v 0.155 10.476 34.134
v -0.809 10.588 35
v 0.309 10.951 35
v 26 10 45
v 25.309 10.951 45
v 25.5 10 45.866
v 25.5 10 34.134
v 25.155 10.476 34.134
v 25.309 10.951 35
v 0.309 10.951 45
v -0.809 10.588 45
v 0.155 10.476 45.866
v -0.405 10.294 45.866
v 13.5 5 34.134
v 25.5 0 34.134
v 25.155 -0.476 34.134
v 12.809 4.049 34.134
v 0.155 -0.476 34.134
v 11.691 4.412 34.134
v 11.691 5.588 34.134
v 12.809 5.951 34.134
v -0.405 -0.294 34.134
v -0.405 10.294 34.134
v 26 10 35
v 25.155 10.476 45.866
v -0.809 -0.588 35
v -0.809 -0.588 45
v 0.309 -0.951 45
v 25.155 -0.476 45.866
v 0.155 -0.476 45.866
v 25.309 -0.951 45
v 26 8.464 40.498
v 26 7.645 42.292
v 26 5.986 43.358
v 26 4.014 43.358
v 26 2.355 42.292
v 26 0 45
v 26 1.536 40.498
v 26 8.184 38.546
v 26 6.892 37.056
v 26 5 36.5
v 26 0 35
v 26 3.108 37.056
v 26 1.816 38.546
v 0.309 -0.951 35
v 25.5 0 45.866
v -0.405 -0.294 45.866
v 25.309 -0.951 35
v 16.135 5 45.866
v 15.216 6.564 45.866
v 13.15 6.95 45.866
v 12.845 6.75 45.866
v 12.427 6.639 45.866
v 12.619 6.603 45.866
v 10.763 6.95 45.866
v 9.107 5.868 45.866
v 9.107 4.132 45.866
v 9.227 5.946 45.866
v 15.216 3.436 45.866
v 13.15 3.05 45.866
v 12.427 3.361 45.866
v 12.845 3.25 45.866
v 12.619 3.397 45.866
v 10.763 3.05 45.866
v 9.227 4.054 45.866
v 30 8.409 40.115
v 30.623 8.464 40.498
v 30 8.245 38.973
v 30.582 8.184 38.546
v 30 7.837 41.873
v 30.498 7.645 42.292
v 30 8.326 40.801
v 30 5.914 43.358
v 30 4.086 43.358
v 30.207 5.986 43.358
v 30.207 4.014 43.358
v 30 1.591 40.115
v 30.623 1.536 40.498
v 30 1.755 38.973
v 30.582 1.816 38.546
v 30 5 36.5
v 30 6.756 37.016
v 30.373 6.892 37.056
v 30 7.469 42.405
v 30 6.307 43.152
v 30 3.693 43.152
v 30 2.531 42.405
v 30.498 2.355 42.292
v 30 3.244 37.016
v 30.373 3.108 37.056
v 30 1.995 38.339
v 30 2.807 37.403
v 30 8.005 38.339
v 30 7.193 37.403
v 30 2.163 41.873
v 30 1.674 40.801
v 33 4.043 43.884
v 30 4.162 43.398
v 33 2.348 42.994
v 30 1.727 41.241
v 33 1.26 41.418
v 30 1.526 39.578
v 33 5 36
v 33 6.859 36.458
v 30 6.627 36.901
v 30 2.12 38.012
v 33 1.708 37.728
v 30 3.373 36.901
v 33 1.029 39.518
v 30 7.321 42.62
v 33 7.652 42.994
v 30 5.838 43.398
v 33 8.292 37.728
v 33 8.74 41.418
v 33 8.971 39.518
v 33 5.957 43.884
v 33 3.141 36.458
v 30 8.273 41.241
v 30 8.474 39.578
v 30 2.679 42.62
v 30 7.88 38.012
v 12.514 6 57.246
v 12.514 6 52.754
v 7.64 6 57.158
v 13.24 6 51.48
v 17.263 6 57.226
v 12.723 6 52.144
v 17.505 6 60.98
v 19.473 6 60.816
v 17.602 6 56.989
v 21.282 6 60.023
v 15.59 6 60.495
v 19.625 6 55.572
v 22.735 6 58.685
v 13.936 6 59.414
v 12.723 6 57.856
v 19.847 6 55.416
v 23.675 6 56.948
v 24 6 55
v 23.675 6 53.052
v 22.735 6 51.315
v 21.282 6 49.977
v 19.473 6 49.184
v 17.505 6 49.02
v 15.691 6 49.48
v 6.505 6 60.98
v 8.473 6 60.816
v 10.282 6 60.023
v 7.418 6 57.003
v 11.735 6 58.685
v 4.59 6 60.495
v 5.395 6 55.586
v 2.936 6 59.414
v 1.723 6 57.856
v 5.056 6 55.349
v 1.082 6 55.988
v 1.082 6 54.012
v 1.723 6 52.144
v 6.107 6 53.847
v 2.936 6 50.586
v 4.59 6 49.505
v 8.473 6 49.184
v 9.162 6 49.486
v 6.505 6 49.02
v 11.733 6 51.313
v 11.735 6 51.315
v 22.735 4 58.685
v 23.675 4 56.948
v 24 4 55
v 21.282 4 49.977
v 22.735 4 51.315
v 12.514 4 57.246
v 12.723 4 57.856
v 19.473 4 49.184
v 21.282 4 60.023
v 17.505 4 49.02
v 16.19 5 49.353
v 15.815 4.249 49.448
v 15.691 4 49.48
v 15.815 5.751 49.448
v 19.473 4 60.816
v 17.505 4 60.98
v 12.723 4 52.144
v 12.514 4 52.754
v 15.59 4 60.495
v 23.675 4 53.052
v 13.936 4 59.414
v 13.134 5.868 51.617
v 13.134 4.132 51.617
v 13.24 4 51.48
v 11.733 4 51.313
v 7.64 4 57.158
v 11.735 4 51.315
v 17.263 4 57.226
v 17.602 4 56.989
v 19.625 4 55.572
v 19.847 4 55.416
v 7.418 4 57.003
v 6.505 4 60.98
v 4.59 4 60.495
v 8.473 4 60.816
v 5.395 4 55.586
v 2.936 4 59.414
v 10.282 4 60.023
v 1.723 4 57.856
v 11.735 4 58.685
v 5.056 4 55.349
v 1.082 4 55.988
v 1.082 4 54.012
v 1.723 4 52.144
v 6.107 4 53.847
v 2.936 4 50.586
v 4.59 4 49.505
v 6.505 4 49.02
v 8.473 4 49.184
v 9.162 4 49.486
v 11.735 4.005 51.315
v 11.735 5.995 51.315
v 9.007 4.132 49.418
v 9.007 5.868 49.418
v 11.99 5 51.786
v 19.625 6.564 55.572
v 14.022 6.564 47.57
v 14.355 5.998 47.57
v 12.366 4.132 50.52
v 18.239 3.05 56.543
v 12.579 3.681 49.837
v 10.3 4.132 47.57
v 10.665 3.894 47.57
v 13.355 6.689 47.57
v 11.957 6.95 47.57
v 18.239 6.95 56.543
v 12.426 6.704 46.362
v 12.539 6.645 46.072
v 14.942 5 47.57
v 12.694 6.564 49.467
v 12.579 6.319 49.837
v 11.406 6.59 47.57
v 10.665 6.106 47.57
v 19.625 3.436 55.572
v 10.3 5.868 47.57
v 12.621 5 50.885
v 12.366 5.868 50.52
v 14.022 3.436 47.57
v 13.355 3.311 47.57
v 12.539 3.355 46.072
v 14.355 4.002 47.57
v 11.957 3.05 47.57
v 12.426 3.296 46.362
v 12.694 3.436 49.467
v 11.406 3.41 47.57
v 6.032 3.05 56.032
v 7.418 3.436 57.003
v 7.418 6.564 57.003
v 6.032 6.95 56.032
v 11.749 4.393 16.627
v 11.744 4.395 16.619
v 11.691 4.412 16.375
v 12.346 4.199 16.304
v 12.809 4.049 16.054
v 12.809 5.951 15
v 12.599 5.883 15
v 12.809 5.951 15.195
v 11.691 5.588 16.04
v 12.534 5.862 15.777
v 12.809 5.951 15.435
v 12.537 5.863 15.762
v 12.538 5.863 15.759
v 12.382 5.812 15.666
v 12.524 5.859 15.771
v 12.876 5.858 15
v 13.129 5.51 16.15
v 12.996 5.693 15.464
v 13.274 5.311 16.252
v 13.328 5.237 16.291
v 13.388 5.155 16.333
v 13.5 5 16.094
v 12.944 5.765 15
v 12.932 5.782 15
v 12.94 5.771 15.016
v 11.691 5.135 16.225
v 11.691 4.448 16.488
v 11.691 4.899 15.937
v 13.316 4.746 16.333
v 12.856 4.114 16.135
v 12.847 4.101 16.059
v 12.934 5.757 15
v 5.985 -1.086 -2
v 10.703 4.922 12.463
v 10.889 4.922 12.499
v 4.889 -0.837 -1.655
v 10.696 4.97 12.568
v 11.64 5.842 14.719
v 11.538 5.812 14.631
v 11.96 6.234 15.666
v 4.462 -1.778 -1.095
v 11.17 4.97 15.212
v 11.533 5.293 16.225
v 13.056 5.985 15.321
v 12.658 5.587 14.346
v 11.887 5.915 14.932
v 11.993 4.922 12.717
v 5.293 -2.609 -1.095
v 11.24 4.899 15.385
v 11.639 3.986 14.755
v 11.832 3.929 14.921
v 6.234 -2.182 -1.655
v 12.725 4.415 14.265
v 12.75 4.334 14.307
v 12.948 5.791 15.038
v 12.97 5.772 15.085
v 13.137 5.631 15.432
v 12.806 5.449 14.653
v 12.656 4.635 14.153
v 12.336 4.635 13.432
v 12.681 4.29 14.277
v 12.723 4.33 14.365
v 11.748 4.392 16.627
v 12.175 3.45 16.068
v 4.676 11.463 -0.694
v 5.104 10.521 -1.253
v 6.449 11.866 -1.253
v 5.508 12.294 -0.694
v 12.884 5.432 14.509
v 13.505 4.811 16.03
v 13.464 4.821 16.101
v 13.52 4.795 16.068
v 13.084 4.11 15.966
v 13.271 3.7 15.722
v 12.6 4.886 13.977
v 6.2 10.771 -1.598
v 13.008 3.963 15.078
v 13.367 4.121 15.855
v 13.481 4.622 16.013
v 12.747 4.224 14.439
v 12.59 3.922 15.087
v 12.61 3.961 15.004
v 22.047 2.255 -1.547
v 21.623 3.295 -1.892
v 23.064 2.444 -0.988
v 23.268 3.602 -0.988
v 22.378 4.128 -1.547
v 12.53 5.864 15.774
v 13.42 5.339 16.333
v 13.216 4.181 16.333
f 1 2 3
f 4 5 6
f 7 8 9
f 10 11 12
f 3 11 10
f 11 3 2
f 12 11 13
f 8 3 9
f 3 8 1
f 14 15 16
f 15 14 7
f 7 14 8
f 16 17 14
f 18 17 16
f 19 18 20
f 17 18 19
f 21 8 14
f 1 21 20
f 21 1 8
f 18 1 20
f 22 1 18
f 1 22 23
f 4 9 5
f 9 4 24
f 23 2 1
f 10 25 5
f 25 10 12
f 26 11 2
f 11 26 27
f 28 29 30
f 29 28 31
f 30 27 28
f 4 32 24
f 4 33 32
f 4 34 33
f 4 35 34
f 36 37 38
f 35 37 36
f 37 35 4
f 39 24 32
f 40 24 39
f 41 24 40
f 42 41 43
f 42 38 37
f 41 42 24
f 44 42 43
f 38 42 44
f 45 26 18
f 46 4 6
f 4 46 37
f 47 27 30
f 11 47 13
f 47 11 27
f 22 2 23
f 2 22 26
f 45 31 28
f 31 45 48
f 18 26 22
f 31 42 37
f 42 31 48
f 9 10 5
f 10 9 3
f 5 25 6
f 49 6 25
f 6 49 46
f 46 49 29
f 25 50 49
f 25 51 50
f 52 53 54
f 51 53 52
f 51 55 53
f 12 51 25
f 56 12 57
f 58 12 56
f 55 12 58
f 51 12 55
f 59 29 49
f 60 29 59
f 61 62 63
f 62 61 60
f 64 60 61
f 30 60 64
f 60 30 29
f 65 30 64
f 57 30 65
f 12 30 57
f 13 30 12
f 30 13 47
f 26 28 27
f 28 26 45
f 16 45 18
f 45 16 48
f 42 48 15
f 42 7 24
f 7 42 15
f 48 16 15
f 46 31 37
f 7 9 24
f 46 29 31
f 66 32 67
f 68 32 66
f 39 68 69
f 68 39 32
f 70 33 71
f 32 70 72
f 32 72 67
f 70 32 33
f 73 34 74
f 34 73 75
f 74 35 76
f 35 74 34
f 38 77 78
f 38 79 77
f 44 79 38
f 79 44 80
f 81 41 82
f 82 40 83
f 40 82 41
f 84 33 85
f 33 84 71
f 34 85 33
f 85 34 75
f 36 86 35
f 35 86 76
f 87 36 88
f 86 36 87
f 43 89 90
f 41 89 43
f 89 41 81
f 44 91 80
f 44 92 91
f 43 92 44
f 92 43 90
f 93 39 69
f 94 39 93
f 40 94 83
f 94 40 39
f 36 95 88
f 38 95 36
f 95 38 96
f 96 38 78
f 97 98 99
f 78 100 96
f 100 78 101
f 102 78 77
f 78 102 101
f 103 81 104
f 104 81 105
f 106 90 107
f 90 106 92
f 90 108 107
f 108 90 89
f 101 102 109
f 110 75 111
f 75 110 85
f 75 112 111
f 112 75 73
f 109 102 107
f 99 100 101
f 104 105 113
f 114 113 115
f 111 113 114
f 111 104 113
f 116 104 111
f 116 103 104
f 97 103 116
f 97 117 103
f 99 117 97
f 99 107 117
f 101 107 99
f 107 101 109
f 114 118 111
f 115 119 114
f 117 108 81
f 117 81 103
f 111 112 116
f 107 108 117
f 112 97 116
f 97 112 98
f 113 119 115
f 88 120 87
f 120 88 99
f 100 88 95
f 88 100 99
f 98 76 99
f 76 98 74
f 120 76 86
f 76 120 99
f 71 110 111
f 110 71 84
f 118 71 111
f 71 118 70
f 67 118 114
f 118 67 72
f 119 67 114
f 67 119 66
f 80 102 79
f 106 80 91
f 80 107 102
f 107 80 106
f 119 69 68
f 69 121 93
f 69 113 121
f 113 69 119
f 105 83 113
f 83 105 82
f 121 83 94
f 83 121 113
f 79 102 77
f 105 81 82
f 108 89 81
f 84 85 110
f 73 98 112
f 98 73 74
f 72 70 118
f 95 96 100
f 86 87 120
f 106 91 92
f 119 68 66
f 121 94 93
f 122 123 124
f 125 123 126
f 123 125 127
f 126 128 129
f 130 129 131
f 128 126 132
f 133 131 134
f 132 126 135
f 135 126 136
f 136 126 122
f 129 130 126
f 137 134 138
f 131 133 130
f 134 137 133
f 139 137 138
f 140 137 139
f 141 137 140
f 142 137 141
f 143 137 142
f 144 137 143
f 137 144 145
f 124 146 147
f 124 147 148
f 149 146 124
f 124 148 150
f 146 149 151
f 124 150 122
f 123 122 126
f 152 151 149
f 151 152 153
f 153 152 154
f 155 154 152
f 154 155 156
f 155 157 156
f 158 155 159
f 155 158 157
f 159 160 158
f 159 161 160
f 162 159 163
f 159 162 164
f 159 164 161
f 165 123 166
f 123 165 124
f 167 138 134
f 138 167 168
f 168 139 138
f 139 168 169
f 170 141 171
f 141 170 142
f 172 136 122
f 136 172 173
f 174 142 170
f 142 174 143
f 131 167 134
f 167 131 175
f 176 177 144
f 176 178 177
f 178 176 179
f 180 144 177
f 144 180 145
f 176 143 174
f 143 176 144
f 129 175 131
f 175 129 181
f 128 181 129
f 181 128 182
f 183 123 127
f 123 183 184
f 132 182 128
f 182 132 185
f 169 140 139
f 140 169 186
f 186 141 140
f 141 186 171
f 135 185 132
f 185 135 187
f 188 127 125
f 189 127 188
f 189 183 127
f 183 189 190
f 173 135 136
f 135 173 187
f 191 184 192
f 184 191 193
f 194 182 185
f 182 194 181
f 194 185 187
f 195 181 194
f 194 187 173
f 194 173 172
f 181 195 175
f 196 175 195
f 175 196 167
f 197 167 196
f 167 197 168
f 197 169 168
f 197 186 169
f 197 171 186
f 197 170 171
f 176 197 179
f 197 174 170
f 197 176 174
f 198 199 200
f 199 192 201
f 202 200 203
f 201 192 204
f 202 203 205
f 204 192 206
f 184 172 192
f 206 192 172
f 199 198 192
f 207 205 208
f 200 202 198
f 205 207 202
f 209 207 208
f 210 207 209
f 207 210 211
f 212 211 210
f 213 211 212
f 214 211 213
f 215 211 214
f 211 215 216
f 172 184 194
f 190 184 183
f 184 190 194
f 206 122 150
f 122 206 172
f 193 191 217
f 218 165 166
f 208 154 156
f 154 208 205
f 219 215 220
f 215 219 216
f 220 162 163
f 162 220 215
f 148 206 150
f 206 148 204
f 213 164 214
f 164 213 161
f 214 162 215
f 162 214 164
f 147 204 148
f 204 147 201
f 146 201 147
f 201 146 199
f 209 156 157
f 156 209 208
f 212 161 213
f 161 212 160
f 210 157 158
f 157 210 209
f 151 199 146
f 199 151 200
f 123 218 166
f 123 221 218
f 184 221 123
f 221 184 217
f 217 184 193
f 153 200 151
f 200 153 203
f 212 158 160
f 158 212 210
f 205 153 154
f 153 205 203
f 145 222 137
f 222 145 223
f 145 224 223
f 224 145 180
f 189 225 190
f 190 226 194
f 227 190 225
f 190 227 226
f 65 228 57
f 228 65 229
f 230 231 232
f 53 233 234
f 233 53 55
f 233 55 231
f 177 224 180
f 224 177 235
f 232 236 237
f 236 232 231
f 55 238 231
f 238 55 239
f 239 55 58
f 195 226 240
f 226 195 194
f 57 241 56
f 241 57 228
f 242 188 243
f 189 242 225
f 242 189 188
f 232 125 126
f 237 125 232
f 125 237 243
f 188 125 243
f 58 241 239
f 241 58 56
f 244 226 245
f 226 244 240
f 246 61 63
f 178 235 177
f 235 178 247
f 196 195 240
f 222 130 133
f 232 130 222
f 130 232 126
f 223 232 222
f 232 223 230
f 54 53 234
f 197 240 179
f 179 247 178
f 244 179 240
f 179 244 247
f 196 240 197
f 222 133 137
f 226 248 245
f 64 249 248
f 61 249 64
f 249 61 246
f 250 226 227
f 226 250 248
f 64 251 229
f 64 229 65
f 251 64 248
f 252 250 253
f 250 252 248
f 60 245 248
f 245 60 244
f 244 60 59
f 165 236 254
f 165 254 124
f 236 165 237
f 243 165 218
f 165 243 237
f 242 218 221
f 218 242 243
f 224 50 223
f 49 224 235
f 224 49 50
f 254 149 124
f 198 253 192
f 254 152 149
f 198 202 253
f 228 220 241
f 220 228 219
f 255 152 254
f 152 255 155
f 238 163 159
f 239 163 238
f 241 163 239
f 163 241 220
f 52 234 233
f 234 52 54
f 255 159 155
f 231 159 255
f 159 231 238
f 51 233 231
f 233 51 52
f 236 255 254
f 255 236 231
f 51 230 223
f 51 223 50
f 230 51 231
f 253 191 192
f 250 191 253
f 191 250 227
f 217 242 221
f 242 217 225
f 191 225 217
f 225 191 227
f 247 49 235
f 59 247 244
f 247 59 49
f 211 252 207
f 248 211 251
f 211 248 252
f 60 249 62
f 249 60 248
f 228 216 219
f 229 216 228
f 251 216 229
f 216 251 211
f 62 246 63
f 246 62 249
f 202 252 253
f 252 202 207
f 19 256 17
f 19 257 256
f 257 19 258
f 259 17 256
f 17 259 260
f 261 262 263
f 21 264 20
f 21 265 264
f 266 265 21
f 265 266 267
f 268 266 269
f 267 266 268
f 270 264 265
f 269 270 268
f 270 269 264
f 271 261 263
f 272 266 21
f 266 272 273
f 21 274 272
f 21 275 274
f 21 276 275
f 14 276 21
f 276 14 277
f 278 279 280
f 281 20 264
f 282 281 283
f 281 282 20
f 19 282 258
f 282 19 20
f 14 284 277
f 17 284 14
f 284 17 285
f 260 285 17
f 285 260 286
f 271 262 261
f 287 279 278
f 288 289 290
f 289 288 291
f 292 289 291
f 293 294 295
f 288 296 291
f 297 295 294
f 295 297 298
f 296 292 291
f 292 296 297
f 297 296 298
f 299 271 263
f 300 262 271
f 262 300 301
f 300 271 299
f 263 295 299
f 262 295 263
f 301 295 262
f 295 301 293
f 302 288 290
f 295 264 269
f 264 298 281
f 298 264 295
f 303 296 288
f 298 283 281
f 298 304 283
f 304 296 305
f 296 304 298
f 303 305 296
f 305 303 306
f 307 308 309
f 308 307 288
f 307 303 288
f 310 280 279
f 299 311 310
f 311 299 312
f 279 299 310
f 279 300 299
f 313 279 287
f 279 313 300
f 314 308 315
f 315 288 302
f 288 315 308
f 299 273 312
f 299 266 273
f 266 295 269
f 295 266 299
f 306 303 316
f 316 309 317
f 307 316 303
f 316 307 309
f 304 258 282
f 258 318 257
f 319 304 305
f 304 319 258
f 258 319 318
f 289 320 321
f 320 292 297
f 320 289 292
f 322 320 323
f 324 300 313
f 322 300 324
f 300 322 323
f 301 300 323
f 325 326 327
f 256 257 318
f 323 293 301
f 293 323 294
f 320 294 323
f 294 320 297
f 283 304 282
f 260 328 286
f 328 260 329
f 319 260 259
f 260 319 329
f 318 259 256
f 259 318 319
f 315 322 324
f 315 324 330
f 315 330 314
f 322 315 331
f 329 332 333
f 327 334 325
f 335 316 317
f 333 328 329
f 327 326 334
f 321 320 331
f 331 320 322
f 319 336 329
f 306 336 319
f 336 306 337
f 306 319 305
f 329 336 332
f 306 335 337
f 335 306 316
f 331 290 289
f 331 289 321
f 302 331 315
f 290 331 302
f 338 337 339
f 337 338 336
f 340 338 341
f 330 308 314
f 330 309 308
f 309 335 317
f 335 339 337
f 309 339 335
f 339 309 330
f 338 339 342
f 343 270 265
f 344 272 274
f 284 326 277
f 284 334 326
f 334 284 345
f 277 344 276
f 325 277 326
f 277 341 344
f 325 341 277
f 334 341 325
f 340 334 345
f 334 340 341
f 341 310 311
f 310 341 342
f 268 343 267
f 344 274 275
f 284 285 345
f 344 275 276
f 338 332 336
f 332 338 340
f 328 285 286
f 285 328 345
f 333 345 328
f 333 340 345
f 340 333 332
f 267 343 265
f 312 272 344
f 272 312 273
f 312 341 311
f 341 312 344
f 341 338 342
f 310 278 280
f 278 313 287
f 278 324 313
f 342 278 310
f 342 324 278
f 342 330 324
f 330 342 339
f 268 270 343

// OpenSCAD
//камера

translate ([0, 0, 35]) {
//корпус
minkowski () {
cube ([25, 10, 10]);
sphere (1);
}


//лупа
translate ([25, 5, 5])rotate ([0, 90, 0])cylinder (7, 3.5, 3.5);
translate ([30, 5, 5])rotate ([0, 90, 0])cylinder (3, 3.5, 4);
}

//диски
translate ([18, 6, 55]) rotate ([90, 0, 0])cylinder (2, 6, 6);
translate ([7, 6, 55]) rotate ([90, 0, 0])cylinder (2, 6, 6);
translate ([10, 5, 44]) rotate ([0,35,0])cylinder (15, 2, 2);
translate ([15, 5, 44]) rotate ([0,-35,0])cylinder (15, 2, 2);


//штатив
translate ([12.5, 5, 15])cylinder (20,1,1);
rotate ([0, 30, 45])translate ([3, -5, 0])cylinder (20, 1, 1);
rotate ([0, 30, -45])translate ([-3, 12, -3])cylinder (20, 1, 1);
rotate ([0, 30, 170])translate ([-18, -7, -12])cylinder (20, 1, 1);
